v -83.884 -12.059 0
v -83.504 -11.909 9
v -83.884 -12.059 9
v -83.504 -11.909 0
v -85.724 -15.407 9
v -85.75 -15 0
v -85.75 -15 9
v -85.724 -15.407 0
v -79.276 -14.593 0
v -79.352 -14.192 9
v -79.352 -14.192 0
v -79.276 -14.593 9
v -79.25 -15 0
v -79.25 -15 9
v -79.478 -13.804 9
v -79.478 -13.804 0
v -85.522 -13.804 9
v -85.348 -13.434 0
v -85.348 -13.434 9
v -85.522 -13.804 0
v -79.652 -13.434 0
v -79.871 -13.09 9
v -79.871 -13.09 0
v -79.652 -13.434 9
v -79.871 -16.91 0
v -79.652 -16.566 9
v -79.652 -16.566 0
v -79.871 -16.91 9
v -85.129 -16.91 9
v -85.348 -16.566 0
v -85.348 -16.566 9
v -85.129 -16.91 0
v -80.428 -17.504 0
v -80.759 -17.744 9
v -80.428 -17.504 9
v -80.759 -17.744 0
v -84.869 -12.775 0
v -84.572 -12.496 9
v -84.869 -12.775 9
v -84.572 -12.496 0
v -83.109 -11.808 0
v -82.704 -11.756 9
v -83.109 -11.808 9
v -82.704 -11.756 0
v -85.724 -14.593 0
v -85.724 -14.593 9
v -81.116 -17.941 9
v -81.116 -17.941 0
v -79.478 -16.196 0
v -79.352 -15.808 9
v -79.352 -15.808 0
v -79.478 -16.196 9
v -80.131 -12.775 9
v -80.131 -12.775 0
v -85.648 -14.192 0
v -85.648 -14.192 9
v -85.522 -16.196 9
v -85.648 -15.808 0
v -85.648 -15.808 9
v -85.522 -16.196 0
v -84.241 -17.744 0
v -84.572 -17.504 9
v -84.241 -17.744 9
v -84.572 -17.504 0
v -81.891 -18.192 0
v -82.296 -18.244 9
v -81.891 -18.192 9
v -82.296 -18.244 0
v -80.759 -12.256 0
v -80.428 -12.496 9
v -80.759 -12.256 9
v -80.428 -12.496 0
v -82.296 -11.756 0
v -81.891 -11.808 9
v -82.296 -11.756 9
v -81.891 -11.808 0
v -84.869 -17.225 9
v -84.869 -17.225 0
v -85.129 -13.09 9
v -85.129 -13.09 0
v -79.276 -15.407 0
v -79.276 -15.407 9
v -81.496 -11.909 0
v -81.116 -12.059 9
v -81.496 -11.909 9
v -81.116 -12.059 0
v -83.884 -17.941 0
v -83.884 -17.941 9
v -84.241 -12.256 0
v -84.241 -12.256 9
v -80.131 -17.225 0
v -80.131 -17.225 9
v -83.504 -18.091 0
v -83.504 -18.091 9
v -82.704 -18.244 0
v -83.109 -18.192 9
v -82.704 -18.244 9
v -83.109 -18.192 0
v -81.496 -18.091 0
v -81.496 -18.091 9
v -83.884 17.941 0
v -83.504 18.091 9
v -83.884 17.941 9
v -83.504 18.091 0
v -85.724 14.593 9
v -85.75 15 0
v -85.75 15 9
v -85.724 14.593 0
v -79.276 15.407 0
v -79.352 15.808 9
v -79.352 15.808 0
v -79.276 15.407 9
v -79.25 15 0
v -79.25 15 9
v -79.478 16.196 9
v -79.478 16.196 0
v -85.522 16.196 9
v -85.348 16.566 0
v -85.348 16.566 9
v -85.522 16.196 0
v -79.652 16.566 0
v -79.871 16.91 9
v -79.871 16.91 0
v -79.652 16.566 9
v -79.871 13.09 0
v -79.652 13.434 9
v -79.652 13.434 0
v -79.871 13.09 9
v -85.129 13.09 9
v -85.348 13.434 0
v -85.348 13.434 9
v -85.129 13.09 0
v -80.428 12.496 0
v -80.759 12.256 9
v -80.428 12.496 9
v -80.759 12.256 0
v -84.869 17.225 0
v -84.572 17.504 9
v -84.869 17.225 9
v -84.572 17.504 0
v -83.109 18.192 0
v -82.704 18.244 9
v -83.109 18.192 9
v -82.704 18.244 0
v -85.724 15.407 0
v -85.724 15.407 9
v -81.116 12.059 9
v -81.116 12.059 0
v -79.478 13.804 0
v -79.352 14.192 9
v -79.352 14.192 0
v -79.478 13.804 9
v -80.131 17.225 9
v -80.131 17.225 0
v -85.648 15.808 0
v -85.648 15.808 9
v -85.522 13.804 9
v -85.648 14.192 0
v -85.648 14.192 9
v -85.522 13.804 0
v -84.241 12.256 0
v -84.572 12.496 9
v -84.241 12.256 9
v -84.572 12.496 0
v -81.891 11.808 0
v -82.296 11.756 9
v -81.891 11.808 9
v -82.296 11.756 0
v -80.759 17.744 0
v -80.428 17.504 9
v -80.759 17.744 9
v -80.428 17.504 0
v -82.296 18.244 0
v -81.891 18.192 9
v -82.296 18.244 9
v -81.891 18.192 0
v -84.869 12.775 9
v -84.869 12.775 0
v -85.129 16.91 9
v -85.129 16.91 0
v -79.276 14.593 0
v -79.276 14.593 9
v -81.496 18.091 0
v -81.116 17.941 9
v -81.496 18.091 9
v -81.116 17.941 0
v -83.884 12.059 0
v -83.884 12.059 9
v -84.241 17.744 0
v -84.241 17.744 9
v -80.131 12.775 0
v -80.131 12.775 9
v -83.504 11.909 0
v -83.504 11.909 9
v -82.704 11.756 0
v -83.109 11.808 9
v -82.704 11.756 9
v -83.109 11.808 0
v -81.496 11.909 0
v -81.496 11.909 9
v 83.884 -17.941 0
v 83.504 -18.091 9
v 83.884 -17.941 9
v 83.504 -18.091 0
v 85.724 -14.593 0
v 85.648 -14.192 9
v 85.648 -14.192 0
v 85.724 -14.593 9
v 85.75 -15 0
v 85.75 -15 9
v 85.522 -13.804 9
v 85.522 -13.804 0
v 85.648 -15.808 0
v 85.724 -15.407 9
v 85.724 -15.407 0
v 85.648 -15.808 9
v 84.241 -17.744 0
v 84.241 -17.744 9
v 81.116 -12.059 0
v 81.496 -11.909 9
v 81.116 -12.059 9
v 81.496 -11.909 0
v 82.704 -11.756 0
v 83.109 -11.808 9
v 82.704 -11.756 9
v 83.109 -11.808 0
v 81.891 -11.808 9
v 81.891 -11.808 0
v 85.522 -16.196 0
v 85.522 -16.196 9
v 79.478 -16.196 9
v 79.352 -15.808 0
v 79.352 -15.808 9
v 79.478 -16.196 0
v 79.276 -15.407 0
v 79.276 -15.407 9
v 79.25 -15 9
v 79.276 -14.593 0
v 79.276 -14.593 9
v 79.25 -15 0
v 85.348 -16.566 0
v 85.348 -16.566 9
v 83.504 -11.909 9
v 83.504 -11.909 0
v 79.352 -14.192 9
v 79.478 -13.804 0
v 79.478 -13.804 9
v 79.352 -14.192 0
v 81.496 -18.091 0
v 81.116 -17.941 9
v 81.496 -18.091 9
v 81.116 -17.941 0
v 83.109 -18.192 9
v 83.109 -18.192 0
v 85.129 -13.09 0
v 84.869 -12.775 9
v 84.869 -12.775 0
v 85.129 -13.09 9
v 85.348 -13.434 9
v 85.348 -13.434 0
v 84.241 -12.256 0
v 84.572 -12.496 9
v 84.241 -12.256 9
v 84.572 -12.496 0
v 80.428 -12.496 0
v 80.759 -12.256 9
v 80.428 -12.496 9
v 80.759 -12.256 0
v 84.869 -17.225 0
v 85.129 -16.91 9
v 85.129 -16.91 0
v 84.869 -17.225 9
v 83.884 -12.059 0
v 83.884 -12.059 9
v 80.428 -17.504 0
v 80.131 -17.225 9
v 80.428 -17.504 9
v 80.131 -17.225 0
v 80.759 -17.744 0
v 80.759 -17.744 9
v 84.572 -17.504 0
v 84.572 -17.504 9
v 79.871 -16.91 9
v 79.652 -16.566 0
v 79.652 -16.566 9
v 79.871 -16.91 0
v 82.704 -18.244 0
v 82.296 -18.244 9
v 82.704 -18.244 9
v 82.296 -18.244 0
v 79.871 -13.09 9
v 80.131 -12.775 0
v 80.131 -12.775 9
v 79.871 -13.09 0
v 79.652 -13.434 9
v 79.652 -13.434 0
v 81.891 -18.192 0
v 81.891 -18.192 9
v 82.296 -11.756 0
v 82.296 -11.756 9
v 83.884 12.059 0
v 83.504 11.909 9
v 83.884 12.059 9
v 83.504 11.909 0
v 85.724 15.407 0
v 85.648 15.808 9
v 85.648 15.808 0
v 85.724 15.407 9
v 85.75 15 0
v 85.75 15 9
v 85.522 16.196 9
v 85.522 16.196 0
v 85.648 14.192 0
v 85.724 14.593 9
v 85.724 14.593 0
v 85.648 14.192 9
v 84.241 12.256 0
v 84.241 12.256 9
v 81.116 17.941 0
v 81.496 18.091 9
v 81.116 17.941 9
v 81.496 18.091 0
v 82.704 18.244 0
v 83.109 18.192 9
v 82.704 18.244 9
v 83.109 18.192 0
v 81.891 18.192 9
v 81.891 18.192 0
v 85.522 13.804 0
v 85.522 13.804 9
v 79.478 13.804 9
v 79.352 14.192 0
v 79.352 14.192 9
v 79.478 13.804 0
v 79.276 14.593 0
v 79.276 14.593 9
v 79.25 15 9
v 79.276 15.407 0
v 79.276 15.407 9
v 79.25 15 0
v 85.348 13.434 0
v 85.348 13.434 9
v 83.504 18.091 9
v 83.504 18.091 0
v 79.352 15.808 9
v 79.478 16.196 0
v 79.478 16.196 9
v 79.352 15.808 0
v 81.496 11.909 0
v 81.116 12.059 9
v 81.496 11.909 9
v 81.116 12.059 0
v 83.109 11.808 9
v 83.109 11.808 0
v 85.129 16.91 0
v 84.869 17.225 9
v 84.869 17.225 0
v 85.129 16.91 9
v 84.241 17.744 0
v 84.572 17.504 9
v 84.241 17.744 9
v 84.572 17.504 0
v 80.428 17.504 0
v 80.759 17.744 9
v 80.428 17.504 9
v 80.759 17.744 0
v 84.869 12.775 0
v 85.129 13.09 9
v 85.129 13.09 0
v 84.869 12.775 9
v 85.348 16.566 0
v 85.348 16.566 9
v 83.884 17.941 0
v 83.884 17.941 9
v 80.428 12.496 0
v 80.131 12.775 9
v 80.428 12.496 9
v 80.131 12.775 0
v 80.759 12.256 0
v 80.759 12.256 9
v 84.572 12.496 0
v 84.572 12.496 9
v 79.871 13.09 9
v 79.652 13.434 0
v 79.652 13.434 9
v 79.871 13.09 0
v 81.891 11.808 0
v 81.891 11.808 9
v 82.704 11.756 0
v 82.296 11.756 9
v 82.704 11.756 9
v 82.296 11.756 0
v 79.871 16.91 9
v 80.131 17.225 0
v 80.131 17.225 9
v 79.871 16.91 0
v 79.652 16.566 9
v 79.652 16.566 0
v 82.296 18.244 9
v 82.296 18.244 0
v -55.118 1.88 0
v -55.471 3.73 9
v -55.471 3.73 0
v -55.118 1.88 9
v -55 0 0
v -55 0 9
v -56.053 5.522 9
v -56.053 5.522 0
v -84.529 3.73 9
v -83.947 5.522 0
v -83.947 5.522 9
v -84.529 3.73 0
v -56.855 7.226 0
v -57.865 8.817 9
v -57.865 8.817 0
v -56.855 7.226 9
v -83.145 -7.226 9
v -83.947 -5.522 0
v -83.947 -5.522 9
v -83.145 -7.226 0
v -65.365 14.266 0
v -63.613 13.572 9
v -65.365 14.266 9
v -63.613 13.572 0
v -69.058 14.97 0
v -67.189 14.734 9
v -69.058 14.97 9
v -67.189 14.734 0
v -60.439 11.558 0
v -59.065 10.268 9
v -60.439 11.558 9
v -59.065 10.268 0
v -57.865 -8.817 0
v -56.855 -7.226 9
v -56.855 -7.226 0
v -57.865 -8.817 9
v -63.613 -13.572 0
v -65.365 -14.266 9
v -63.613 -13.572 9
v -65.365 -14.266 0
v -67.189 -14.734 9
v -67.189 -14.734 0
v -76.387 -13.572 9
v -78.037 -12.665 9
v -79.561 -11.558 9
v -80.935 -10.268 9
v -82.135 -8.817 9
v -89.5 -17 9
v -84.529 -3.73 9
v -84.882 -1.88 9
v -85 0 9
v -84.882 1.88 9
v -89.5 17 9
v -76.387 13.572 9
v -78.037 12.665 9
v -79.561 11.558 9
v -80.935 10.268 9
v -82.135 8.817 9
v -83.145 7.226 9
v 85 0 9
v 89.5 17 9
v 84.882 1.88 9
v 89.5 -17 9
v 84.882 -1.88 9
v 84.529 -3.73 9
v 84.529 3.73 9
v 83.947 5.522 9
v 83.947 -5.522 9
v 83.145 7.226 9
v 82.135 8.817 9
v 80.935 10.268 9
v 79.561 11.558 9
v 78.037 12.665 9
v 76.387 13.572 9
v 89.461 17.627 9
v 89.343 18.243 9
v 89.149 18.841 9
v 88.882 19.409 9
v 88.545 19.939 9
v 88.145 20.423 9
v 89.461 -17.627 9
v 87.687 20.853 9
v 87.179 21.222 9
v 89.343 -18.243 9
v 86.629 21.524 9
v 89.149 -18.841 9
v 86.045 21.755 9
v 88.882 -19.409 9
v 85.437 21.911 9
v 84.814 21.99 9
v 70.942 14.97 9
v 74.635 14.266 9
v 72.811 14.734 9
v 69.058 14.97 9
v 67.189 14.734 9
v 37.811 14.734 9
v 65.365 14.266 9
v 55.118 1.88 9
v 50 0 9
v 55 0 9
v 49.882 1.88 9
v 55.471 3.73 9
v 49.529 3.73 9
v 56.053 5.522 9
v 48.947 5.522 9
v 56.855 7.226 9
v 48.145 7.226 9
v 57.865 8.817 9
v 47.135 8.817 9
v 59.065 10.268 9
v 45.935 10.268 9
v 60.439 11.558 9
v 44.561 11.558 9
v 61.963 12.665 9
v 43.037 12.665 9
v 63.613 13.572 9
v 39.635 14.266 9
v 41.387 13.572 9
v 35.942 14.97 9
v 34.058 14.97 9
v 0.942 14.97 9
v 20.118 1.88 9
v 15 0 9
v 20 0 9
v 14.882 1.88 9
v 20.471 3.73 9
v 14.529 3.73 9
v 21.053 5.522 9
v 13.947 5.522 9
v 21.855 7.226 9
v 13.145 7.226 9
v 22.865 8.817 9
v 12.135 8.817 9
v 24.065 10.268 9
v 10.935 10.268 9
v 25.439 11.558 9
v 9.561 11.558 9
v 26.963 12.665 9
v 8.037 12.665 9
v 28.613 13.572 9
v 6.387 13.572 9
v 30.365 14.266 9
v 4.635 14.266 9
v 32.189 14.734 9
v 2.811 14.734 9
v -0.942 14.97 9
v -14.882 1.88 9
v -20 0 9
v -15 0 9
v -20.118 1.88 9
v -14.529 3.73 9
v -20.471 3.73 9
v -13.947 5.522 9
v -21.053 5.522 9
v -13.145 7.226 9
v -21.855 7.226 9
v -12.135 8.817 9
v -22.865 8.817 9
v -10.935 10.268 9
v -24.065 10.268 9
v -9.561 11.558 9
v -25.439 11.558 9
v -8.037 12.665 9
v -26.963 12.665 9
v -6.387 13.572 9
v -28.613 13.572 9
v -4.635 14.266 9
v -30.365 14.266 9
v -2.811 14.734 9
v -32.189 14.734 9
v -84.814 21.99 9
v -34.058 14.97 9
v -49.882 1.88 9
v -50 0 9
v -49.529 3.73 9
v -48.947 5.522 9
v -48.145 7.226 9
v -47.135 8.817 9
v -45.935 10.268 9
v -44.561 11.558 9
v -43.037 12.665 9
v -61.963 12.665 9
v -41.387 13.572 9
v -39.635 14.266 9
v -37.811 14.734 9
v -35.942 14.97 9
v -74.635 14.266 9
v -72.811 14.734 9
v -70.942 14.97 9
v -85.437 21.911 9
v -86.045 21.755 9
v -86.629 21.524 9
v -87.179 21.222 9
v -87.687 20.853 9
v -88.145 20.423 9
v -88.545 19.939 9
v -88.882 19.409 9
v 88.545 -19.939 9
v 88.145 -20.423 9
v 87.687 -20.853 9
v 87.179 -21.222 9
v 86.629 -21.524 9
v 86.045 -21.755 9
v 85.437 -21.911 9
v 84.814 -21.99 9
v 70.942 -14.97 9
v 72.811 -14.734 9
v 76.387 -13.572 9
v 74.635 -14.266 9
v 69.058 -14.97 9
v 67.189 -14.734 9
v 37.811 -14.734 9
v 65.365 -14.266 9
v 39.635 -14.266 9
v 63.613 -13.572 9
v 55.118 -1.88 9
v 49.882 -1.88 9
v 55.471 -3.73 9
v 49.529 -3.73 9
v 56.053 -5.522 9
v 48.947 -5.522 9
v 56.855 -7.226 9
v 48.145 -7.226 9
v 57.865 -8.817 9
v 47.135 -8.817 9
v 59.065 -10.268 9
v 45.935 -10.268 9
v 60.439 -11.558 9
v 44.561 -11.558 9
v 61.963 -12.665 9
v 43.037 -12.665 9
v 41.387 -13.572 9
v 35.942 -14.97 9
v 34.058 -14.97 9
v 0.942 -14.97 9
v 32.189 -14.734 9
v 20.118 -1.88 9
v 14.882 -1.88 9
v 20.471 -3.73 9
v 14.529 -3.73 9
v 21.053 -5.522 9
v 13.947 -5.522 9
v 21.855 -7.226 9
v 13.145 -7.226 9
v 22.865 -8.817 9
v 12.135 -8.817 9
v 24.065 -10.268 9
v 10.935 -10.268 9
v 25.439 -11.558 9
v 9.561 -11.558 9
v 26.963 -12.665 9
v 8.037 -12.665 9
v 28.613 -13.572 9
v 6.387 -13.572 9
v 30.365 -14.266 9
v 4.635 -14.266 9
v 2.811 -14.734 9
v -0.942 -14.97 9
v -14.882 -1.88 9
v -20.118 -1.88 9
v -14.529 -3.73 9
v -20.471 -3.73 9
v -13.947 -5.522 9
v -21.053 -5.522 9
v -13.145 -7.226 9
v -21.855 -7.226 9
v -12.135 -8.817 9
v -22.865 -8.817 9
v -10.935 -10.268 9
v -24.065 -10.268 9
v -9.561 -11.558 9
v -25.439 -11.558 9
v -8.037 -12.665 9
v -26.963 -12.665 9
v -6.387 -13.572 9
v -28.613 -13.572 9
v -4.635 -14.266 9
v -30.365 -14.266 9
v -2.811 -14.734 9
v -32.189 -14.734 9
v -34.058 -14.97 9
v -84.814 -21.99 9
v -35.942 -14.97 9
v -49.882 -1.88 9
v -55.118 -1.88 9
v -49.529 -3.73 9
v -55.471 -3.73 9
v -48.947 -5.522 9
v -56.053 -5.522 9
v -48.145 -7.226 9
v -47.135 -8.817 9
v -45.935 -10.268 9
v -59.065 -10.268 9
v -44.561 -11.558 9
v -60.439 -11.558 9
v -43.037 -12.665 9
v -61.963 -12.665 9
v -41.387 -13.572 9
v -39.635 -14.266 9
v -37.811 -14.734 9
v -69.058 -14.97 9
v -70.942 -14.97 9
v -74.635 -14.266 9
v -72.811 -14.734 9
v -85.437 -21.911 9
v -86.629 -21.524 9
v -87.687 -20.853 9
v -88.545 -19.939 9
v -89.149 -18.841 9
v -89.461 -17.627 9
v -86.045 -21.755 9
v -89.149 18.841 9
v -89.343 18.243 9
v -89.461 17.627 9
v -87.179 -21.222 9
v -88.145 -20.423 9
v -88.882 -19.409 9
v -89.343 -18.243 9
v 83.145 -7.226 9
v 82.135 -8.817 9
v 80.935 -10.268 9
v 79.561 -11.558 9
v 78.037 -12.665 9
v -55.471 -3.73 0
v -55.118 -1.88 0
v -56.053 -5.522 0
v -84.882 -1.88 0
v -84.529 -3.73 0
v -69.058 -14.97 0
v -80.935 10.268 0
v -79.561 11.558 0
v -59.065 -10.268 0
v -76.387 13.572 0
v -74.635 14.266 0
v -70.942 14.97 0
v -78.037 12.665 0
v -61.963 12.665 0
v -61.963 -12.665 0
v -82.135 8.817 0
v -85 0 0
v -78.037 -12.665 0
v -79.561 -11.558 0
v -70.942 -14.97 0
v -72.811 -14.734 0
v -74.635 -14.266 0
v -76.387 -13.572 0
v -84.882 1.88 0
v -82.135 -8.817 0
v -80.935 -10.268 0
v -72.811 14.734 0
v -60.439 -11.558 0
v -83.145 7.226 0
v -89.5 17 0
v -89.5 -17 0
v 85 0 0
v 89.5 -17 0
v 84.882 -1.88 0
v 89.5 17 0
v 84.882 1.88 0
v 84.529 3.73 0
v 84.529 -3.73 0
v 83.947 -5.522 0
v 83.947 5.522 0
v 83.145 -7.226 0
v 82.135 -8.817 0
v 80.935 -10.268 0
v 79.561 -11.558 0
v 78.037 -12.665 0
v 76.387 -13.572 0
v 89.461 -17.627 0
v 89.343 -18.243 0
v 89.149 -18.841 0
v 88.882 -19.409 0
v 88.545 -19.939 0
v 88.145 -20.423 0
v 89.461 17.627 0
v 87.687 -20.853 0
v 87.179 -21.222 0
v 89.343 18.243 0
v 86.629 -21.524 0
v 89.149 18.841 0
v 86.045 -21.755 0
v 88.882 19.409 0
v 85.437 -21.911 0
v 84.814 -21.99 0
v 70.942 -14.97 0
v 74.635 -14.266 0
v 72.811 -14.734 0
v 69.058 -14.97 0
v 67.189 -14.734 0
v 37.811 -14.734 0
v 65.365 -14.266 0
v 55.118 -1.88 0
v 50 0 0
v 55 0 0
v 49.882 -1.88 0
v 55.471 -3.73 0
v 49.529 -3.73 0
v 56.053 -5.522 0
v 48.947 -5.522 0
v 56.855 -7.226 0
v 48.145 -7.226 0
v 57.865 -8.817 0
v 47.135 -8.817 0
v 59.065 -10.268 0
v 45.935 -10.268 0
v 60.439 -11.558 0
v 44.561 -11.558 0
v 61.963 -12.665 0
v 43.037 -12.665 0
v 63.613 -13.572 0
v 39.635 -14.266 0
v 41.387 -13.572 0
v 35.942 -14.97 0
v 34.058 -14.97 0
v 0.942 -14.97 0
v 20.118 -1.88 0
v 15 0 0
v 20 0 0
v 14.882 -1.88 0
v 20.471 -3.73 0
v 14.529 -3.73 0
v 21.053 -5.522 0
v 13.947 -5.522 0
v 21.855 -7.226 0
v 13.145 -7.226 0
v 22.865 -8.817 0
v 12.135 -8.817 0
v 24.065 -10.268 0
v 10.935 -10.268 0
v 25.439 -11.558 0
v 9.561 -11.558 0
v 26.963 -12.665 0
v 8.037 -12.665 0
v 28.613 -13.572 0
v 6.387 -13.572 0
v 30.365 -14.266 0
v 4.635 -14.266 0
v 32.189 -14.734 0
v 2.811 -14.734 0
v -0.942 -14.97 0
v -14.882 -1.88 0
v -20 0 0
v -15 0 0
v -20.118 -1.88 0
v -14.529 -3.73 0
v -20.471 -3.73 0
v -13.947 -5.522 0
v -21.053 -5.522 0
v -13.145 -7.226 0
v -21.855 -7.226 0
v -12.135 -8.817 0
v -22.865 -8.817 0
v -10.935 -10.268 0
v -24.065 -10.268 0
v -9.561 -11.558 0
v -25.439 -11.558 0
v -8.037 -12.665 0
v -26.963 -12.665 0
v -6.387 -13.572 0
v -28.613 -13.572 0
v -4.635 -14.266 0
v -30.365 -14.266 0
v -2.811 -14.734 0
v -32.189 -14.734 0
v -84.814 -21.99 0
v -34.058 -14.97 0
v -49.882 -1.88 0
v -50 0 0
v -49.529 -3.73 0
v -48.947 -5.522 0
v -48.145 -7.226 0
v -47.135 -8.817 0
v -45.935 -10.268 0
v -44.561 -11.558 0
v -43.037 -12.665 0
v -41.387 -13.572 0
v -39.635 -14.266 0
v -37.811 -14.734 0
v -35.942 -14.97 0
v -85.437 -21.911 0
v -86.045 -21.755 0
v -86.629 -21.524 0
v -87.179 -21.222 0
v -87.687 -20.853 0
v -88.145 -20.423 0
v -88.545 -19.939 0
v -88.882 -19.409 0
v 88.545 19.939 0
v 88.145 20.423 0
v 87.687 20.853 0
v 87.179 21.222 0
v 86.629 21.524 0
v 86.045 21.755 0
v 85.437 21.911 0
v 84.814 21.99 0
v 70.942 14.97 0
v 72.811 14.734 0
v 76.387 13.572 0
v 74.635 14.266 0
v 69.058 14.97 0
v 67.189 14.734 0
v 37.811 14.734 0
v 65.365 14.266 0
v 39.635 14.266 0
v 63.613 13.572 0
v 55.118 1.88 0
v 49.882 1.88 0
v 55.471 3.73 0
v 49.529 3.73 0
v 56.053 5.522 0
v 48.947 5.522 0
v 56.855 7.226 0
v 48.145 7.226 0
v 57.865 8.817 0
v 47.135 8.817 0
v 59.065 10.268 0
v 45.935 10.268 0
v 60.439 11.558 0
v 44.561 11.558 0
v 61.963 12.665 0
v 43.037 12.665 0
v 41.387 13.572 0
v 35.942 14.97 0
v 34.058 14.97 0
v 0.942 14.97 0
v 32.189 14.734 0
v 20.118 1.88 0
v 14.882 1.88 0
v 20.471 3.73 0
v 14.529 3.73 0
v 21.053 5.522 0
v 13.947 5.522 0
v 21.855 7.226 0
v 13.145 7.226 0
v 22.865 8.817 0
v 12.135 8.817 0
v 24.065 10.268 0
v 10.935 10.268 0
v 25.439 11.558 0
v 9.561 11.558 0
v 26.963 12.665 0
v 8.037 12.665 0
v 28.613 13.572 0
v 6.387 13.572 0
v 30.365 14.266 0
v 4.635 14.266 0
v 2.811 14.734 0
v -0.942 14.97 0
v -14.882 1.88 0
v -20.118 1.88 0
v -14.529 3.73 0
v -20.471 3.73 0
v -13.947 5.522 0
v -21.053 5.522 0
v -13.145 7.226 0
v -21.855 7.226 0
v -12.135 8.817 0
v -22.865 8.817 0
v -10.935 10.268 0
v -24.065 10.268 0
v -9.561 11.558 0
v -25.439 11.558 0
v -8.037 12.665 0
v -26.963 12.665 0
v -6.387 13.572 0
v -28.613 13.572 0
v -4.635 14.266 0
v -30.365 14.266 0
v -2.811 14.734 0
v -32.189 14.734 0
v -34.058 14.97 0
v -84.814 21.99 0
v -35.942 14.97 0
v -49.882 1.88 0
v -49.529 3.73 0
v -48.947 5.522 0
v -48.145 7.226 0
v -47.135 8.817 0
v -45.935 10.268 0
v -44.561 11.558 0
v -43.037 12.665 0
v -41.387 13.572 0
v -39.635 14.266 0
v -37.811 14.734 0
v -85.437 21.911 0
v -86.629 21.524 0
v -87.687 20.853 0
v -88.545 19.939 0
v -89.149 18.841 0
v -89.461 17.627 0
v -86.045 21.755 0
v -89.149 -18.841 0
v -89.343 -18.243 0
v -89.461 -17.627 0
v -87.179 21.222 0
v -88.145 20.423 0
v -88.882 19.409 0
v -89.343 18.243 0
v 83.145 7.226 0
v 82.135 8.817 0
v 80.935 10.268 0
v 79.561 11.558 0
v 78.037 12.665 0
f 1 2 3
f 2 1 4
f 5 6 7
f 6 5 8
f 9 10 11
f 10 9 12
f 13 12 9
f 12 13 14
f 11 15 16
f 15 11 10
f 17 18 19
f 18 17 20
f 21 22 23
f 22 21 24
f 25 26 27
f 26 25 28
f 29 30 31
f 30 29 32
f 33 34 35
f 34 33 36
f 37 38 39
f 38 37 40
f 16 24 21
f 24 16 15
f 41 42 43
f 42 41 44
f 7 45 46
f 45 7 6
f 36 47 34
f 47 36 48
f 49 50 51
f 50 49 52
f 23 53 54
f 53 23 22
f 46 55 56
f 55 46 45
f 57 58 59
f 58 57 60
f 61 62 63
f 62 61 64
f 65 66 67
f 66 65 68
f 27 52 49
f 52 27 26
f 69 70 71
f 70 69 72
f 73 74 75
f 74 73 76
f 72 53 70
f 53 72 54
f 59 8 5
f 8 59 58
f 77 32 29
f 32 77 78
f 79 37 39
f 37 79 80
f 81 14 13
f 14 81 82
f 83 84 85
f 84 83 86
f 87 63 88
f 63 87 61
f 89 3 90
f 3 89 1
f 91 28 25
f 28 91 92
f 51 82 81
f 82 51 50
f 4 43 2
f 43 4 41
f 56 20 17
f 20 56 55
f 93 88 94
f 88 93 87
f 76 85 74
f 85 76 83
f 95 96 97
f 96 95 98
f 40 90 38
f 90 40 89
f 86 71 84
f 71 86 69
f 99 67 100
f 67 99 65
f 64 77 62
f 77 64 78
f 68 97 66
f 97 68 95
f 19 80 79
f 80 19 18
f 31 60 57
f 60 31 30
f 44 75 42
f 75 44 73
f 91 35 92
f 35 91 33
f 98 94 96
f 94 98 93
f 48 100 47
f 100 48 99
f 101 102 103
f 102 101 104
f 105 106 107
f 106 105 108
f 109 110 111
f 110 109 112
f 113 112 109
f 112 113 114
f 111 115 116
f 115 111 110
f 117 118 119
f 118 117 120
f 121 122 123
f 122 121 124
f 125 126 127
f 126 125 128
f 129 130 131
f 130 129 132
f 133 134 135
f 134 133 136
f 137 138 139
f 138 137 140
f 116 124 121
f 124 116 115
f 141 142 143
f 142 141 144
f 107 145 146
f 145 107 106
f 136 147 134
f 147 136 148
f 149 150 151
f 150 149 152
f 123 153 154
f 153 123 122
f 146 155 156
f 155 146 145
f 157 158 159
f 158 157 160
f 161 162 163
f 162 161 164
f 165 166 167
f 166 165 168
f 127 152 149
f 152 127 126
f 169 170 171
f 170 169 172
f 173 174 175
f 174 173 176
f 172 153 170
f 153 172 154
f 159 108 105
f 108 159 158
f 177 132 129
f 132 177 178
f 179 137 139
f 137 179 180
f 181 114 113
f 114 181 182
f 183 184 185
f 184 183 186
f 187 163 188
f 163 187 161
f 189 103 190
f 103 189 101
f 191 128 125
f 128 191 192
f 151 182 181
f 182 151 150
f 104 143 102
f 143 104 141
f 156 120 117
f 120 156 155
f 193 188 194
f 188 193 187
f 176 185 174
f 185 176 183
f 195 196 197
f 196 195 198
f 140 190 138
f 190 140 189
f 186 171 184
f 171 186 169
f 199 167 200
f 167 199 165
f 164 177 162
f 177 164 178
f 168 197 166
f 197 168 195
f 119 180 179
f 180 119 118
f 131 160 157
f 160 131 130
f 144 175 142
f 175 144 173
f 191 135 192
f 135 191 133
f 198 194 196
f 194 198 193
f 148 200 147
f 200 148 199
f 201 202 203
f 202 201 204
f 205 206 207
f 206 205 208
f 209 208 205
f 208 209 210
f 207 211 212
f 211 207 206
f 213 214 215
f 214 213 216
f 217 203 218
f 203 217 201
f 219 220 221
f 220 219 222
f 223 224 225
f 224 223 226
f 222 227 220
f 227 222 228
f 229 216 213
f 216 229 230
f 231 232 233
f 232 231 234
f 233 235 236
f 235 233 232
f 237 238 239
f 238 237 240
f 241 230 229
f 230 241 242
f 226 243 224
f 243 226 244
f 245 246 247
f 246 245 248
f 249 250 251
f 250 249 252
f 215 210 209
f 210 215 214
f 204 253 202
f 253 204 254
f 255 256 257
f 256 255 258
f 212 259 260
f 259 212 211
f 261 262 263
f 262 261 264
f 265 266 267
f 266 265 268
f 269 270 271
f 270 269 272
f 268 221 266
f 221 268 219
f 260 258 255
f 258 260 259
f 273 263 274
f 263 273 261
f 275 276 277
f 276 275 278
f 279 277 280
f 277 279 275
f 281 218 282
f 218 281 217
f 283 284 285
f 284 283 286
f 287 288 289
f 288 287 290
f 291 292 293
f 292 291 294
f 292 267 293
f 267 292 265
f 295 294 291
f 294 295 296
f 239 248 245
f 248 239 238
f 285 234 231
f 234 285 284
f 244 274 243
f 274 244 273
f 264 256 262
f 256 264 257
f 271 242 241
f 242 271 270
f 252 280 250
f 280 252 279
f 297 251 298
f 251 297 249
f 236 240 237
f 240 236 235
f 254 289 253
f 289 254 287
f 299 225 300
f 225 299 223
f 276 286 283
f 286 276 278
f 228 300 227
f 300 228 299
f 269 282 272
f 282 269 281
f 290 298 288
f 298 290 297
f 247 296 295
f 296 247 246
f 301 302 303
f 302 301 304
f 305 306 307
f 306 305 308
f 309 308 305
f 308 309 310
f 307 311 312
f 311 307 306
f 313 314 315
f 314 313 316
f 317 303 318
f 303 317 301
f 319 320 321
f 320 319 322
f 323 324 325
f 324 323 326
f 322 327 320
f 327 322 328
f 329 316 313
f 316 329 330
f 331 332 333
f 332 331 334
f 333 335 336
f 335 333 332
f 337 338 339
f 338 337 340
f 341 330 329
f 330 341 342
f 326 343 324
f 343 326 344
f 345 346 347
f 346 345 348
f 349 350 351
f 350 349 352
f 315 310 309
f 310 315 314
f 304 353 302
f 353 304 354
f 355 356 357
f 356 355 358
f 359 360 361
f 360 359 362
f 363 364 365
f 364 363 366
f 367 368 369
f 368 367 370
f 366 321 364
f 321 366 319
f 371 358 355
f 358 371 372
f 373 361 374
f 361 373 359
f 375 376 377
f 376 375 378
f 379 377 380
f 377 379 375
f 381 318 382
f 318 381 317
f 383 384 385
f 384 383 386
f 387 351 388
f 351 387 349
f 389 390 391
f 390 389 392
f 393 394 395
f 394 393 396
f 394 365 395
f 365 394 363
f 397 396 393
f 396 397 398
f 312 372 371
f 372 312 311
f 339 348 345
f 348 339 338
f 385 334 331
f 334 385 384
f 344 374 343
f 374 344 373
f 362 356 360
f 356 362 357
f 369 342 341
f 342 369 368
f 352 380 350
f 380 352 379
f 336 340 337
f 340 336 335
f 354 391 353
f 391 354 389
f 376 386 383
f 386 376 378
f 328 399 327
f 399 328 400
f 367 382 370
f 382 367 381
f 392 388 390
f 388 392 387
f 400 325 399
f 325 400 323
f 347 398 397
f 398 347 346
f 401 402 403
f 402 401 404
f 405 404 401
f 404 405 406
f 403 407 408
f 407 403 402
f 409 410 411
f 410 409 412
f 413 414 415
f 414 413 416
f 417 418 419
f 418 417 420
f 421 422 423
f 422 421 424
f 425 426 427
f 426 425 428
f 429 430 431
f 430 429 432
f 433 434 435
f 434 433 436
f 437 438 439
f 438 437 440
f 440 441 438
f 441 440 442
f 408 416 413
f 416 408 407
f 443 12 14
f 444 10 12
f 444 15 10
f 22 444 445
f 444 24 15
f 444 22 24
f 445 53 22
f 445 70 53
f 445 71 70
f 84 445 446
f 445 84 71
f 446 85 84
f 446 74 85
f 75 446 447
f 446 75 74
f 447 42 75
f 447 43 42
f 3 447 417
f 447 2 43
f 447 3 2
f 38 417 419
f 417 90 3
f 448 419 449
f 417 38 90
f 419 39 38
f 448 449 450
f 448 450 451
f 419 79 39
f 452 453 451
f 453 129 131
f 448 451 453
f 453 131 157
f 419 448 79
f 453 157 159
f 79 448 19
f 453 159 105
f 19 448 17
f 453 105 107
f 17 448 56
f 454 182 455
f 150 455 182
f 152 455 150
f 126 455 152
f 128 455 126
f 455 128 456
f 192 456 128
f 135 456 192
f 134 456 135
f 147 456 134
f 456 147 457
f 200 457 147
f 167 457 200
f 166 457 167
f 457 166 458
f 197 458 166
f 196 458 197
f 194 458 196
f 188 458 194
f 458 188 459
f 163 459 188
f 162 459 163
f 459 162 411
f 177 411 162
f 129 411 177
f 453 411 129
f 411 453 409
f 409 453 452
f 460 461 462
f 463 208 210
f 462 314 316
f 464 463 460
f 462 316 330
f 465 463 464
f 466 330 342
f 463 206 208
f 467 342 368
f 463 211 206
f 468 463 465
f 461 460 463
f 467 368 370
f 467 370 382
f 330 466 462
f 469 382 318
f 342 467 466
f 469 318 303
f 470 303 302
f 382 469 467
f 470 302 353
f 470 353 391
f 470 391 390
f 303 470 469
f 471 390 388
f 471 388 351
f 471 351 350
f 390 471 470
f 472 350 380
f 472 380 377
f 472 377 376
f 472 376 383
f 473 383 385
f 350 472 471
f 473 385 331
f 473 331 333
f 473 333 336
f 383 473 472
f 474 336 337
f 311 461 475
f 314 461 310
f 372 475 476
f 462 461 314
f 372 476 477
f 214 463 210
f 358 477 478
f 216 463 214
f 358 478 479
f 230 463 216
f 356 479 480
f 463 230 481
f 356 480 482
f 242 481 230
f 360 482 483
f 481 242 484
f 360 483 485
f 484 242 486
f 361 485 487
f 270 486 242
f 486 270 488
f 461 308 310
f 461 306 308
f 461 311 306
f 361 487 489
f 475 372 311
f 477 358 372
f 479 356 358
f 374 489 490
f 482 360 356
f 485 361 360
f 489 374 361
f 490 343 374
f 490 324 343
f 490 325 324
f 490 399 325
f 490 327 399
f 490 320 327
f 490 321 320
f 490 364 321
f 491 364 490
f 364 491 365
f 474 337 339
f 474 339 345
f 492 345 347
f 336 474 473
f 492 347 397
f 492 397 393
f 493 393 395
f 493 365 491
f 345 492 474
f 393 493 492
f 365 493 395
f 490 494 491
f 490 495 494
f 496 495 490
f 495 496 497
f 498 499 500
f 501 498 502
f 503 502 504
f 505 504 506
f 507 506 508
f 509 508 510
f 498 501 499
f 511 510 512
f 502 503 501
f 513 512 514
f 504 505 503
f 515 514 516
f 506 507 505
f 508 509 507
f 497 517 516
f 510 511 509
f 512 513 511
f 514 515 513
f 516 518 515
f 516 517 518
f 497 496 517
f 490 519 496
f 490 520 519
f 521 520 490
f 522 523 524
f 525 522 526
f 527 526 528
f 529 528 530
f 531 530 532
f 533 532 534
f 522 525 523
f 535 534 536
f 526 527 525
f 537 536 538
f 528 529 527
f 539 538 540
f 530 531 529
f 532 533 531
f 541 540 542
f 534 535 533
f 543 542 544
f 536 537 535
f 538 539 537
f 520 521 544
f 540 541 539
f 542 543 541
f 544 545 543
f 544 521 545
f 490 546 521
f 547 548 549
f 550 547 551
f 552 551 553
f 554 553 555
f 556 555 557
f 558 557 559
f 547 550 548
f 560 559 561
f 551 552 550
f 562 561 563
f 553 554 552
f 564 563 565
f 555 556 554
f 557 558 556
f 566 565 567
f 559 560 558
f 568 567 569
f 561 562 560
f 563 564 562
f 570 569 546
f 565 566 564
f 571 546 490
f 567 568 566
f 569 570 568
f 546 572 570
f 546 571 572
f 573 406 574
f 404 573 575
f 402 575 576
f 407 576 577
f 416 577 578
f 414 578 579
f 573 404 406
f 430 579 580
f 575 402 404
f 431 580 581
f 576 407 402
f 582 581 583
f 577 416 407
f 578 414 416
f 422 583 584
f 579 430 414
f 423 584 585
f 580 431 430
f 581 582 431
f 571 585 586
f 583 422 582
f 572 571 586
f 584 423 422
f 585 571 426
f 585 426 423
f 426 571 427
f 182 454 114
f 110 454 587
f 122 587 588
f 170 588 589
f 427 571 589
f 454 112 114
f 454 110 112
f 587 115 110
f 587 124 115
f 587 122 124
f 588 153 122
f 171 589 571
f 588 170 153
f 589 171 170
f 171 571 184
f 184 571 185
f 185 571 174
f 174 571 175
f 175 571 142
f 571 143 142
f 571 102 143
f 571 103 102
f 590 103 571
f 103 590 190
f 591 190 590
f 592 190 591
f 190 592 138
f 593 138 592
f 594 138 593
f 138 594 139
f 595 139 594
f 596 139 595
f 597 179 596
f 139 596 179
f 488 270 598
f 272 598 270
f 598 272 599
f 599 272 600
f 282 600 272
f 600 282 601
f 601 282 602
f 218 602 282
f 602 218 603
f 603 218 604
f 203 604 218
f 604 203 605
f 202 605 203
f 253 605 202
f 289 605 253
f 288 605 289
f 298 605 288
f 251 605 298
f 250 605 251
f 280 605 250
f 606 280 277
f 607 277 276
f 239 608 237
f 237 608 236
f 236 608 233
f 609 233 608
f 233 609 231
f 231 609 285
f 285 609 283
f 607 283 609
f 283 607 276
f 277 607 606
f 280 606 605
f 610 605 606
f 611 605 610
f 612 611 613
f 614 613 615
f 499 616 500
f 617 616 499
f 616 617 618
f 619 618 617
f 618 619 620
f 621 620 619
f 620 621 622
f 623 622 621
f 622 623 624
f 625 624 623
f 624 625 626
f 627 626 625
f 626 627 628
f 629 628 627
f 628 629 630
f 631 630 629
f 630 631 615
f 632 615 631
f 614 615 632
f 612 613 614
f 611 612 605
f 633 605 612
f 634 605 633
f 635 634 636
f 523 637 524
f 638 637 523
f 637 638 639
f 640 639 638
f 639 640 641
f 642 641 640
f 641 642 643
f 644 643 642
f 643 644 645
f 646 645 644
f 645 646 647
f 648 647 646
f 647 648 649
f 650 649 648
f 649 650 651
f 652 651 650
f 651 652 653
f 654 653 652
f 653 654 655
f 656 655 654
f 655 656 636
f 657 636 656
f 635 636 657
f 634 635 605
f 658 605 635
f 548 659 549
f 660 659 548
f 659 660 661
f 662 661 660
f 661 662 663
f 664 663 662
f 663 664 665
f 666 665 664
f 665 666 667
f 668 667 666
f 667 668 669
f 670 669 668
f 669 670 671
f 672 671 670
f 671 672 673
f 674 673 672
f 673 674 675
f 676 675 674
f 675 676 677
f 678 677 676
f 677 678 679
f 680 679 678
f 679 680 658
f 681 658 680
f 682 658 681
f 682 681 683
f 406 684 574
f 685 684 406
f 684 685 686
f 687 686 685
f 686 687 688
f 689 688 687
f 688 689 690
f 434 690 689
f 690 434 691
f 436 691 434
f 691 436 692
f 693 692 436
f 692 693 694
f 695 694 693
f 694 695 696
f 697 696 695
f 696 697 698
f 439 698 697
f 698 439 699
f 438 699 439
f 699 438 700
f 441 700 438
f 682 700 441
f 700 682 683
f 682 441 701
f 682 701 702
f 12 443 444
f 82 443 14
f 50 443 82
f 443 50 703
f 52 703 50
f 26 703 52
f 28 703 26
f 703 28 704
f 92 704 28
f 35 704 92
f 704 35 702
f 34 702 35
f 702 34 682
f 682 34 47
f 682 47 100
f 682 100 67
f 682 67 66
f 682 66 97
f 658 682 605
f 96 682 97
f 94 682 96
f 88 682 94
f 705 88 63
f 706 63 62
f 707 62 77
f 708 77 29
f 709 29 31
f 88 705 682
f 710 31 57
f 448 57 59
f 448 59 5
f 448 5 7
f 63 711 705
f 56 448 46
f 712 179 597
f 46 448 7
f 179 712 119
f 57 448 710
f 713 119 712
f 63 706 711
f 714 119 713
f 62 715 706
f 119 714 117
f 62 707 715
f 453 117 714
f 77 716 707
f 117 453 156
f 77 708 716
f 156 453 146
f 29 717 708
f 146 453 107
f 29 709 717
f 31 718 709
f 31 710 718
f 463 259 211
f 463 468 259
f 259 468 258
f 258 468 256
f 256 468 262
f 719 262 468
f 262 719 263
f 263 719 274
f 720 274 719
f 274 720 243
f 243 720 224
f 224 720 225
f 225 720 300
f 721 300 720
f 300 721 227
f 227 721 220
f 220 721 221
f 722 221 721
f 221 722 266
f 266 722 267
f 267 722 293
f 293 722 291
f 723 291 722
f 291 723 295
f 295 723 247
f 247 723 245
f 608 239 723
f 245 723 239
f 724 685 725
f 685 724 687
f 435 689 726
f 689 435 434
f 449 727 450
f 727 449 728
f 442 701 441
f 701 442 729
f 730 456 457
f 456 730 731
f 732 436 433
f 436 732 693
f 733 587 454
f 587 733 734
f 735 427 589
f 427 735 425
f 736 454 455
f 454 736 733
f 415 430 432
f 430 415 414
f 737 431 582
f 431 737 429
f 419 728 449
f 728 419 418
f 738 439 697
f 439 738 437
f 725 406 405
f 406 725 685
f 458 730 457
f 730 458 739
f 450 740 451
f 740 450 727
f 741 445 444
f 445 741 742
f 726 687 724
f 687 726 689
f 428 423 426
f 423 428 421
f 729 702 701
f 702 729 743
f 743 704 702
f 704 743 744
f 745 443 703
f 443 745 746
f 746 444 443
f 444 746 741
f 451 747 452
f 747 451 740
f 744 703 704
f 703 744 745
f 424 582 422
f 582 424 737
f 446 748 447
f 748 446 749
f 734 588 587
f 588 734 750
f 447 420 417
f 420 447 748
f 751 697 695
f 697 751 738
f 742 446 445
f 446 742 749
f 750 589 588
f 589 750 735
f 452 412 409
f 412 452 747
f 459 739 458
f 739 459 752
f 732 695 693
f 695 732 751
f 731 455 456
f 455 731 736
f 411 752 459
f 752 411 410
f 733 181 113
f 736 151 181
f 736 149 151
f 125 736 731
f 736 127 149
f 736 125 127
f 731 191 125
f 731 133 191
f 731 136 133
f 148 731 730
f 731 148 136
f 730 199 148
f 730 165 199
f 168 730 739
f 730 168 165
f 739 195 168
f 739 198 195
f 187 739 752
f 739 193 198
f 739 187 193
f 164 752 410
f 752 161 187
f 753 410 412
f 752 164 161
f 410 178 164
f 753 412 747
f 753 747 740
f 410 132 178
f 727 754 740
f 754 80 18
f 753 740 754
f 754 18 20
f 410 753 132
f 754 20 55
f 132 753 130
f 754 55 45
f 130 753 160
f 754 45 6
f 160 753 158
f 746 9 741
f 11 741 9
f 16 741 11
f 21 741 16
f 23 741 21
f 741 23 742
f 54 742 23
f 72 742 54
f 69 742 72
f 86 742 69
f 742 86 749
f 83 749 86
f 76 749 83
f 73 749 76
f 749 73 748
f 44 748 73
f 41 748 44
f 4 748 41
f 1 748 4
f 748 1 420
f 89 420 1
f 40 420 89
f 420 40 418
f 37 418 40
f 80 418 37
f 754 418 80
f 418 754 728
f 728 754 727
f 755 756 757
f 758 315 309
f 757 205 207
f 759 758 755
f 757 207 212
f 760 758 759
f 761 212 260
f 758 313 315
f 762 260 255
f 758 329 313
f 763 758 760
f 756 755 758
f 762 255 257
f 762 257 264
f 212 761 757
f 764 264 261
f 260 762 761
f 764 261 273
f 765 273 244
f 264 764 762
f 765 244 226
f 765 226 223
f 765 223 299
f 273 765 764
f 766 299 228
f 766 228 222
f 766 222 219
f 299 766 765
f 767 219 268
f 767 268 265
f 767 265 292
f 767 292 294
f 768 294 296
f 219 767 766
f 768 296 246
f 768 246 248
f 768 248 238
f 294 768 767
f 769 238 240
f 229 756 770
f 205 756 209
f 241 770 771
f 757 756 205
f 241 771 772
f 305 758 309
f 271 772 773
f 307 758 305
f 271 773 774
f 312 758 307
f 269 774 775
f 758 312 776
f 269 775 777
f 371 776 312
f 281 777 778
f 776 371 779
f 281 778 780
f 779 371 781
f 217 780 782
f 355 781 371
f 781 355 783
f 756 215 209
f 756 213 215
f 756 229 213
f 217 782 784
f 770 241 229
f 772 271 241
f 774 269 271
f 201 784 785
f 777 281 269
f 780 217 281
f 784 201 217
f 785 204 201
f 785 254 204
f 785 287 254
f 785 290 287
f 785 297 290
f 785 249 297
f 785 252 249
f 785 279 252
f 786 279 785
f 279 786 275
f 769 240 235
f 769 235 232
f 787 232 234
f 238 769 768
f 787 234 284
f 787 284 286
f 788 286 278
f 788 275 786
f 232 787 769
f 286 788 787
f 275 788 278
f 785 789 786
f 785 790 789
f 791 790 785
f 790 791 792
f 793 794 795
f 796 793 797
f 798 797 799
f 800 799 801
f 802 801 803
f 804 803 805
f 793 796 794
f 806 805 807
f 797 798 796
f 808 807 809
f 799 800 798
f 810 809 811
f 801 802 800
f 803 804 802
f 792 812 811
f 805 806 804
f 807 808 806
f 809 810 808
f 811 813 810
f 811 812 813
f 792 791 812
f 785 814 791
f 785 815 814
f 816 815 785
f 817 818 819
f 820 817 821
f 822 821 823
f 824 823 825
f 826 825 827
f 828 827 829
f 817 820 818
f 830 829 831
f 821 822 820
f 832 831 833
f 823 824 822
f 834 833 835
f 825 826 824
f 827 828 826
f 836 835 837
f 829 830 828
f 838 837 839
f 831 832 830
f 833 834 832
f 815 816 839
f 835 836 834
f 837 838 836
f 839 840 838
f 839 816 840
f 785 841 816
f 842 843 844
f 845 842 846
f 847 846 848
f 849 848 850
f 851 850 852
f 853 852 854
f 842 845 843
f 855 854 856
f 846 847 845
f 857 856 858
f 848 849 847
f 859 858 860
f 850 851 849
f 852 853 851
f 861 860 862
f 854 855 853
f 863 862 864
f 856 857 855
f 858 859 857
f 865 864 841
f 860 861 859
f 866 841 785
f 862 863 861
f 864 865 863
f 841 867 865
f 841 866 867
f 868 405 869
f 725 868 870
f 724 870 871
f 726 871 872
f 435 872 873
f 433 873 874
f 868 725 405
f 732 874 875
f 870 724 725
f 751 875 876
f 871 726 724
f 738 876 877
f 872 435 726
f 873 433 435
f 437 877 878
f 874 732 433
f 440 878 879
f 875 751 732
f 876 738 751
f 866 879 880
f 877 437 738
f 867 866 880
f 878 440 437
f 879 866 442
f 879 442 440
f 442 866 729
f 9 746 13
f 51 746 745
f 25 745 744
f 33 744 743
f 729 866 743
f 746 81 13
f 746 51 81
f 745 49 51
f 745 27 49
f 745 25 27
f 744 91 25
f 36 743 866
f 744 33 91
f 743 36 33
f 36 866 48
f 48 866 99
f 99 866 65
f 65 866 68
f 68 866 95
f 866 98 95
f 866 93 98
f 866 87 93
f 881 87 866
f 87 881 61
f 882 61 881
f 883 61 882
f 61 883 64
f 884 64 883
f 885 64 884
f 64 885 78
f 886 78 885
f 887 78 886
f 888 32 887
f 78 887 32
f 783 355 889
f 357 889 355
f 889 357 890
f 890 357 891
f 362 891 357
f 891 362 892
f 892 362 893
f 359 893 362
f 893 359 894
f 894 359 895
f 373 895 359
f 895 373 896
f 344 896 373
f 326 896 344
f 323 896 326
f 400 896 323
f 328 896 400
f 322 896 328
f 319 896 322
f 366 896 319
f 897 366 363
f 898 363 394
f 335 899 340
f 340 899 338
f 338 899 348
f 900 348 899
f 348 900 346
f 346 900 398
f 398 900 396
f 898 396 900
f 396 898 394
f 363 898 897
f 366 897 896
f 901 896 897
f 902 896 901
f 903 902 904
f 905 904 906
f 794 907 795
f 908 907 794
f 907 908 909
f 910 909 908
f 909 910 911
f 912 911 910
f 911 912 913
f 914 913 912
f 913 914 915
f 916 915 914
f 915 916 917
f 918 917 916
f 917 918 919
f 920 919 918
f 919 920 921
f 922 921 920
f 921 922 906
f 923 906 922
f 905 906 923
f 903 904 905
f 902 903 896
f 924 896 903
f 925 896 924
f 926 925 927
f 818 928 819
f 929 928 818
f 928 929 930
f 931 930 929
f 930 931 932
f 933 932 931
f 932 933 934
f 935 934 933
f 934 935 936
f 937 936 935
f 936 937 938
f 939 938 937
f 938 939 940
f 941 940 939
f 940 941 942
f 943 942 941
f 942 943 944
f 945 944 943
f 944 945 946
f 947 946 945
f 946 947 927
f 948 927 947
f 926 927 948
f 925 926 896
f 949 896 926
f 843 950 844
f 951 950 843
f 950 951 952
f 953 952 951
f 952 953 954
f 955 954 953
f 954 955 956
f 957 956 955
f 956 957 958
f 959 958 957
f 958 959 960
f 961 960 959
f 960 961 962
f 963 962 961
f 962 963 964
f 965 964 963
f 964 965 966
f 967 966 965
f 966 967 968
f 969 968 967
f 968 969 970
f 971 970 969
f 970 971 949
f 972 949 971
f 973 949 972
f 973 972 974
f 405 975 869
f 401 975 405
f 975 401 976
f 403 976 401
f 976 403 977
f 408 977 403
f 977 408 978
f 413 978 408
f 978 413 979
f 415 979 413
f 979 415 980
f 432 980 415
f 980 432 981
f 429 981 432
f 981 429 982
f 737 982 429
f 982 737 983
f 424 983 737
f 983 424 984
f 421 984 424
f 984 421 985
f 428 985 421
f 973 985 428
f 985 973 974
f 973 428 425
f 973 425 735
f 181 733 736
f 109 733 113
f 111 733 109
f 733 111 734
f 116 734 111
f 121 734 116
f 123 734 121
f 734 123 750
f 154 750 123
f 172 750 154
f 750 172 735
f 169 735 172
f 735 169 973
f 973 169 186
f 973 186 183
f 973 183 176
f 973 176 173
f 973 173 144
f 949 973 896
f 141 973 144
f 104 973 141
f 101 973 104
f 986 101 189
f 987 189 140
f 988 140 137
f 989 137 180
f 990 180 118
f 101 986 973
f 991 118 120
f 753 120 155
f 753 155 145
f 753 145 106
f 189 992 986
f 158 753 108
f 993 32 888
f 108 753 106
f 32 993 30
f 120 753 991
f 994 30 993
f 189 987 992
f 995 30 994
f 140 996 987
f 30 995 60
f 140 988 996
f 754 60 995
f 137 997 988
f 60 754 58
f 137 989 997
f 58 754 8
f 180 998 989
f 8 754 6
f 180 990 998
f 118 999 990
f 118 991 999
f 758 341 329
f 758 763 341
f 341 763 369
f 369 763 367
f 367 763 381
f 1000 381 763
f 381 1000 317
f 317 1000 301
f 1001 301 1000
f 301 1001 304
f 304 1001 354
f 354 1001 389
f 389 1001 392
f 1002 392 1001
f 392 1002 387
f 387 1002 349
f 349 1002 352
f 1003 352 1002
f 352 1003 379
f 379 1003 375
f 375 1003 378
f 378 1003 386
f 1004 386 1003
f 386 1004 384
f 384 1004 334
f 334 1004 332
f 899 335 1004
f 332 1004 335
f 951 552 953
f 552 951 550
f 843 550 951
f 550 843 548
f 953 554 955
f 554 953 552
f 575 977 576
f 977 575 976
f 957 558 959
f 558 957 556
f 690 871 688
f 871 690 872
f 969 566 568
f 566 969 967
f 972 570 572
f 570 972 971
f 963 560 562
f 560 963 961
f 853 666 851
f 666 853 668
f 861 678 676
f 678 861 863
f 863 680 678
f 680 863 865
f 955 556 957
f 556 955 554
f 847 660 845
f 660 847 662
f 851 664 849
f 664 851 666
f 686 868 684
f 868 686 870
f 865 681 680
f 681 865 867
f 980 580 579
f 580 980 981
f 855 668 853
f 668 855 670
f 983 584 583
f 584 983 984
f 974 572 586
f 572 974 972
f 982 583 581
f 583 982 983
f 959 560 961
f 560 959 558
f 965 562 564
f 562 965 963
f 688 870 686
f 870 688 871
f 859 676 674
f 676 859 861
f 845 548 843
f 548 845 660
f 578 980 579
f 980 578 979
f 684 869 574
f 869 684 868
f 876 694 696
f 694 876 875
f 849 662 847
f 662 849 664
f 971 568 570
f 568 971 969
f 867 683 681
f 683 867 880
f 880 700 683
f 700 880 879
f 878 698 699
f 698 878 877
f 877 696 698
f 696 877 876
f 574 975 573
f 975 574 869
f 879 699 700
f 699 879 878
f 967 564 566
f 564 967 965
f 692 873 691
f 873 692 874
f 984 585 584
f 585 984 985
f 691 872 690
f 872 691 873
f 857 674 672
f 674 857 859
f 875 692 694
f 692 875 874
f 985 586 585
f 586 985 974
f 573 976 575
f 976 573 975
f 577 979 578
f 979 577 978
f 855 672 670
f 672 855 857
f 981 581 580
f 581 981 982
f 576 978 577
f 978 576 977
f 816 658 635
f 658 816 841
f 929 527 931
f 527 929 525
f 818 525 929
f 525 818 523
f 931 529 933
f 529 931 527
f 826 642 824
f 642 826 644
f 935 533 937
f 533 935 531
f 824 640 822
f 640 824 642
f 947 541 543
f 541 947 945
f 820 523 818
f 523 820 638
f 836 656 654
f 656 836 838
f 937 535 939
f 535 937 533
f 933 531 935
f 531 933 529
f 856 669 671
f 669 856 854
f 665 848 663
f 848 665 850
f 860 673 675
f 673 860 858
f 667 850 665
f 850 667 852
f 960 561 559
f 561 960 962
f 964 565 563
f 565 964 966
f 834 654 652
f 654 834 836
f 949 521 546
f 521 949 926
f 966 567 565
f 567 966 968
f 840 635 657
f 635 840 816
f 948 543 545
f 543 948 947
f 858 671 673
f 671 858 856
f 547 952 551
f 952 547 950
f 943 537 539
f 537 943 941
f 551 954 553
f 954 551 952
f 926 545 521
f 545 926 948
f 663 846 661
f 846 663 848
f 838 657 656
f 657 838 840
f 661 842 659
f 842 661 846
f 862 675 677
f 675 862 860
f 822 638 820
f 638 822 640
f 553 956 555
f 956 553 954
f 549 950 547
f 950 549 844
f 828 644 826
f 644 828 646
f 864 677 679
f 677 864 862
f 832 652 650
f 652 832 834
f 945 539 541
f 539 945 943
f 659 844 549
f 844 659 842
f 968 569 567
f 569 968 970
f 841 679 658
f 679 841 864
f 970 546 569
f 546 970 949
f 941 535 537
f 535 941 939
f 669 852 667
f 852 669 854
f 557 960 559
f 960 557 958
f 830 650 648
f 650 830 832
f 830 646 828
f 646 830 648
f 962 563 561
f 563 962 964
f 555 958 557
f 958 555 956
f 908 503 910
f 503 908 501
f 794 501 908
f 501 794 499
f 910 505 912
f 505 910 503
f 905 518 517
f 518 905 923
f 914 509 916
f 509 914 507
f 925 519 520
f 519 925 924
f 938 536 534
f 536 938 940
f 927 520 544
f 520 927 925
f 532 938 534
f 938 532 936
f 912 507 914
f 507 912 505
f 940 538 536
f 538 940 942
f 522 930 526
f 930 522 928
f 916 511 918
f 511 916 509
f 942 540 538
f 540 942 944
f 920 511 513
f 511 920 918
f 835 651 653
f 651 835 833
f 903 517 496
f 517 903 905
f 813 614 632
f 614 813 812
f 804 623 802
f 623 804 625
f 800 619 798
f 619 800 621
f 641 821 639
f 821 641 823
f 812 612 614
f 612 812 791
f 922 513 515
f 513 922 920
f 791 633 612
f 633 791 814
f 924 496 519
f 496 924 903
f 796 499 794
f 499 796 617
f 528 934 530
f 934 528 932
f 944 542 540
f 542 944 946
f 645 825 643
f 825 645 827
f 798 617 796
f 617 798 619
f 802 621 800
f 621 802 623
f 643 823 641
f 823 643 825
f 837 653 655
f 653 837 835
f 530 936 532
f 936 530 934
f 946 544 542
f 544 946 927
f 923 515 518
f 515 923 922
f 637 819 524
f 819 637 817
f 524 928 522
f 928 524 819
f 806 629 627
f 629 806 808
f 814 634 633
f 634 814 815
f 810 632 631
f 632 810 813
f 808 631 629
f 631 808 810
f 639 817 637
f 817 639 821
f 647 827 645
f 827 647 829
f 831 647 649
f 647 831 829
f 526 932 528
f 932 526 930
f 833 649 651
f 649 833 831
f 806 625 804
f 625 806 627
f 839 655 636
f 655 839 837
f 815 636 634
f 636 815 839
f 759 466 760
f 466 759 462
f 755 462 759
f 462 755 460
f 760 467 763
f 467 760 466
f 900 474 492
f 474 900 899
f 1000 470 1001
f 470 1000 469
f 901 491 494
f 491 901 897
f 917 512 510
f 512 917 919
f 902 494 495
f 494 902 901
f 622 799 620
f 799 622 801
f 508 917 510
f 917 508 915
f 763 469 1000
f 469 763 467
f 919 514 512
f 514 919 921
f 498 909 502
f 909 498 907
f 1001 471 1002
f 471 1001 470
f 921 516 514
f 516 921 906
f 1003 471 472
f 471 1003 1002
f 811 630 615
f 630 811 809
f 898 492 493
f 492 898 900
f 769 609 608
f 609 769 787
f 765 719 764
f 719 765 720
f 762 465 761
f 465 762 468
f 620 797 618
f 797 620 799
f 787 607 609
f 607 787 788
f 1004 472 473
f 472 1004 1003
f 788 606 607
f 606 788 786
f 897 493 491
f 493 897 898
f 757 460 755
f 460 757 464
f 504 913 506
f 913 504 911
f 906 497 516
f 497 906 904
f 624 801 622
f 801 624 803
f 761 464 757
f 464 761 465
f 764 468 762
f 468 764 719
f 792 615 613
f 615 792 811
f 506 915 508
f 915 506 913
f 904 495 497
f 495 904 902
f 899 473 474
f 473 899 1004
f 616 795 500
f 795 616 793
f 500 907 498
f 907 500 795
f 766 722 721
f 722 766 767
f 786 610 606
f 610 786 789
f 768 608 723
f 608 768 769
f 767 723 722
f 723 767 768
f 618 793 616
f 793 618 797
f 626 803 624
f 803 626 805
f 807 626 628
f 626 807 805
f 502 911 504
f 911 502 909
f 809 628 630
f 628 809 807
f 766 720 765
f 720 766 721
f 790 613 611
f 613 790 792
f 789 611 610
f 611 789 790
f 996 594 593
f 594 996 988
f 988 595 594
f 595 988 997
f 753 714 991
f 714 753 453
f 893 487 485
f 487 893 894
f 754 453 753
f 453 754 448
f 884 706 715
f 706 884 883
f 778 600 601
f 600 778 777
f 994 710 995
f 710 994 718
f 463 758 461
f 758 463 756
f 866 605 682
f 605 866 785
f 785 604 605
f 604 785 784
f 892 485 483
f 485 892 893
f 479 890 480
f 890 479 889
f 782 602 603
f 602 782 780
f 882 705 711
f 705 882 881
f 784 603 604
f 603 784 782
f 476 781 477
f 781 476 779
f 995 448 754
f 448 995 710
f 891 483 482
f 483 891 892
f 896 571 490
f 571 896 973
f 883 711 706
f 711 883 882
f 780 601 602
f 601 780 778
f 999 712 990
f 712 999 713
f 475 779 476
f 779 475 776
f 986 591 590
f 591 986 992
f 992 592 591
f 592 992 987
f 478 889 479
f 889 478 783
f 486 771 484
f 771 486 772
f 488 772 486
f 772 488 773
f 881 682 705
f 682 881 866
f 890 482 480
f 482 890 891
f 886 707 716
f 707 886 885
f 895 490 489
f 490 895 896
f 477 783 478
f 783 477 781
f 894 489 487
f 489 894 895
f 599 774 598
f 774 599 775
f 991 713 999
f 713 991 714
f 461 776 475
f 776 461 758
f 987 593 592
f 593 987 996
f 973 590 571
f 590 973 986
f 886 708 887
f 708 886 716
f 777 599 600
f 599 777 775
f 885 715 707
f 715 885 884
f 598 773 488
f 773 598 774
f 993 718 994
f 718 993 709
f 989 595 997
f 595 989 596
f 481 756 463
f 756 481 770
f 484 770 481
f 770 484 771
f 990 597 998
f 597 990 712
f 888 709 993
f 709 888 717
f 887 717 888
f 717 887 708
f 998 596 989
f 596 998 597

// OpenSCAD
$fn = 50;


difference() {
	union() {
		hull() {
			translate(v = [-84.5000000000, 17.0000000000, 0]) {
				cylinder(h = 9, r = 5);
			}
			translate(v = [84.5000000000, 17.0000000000, 0]) {
				cylinder(h = 9, r = 5);
			}
			translate(v = [-84.5000000000, -17.0000000000, 0]) {
				cylinder(h = 9, r = 5);
			}
			translate(v = [84.5000000000, -17.0000000000, 0]) {
				cylinder(h = 9, r = 5);
			}
		}
	}
	union() {
		#translate(v = [-82.5000000000, -15.0000000000, -100.0000000000]) {
			cylinder(h = 200, r = 3.2500000000);
		}
		#translate(v = [-82.5000000000, 15.0000000000, -100.0000000000]) {
			cylinder(h = 200, r = 3.2500000000);
		}
		#translate(v = [82.5000000000, -15.0000000000, -100.0000000000]) {
			cylinder(h = 200, r = 3.2500000000);
		}
		#translate(v = [82.5000000000, 15.0000000000, -100.0000000000]) {
			cylinder(h = 200, r = 3.2500000000);
		}
		#translate(v = [-70.0000000000, 0, 0]) {
			cylinder(h = 9, r = 15.0000000000);
		}
		#translate(v = [-35.0000000000, 0, 0]) {
			cylinder(h = 9, r = 15.0000000000);
		}
		#cylinder(h = 9, r = 15.0000000000);
		#translate(v = [35.0000000000, 0, 0]) {
			cylinder(h = 9, r = 15.0000000000);
		}
		#translate(v = [70.0000000000, 0, 0]) {
			cylinder(h = 9, r = 15.0000000000);
		}
	}
}
